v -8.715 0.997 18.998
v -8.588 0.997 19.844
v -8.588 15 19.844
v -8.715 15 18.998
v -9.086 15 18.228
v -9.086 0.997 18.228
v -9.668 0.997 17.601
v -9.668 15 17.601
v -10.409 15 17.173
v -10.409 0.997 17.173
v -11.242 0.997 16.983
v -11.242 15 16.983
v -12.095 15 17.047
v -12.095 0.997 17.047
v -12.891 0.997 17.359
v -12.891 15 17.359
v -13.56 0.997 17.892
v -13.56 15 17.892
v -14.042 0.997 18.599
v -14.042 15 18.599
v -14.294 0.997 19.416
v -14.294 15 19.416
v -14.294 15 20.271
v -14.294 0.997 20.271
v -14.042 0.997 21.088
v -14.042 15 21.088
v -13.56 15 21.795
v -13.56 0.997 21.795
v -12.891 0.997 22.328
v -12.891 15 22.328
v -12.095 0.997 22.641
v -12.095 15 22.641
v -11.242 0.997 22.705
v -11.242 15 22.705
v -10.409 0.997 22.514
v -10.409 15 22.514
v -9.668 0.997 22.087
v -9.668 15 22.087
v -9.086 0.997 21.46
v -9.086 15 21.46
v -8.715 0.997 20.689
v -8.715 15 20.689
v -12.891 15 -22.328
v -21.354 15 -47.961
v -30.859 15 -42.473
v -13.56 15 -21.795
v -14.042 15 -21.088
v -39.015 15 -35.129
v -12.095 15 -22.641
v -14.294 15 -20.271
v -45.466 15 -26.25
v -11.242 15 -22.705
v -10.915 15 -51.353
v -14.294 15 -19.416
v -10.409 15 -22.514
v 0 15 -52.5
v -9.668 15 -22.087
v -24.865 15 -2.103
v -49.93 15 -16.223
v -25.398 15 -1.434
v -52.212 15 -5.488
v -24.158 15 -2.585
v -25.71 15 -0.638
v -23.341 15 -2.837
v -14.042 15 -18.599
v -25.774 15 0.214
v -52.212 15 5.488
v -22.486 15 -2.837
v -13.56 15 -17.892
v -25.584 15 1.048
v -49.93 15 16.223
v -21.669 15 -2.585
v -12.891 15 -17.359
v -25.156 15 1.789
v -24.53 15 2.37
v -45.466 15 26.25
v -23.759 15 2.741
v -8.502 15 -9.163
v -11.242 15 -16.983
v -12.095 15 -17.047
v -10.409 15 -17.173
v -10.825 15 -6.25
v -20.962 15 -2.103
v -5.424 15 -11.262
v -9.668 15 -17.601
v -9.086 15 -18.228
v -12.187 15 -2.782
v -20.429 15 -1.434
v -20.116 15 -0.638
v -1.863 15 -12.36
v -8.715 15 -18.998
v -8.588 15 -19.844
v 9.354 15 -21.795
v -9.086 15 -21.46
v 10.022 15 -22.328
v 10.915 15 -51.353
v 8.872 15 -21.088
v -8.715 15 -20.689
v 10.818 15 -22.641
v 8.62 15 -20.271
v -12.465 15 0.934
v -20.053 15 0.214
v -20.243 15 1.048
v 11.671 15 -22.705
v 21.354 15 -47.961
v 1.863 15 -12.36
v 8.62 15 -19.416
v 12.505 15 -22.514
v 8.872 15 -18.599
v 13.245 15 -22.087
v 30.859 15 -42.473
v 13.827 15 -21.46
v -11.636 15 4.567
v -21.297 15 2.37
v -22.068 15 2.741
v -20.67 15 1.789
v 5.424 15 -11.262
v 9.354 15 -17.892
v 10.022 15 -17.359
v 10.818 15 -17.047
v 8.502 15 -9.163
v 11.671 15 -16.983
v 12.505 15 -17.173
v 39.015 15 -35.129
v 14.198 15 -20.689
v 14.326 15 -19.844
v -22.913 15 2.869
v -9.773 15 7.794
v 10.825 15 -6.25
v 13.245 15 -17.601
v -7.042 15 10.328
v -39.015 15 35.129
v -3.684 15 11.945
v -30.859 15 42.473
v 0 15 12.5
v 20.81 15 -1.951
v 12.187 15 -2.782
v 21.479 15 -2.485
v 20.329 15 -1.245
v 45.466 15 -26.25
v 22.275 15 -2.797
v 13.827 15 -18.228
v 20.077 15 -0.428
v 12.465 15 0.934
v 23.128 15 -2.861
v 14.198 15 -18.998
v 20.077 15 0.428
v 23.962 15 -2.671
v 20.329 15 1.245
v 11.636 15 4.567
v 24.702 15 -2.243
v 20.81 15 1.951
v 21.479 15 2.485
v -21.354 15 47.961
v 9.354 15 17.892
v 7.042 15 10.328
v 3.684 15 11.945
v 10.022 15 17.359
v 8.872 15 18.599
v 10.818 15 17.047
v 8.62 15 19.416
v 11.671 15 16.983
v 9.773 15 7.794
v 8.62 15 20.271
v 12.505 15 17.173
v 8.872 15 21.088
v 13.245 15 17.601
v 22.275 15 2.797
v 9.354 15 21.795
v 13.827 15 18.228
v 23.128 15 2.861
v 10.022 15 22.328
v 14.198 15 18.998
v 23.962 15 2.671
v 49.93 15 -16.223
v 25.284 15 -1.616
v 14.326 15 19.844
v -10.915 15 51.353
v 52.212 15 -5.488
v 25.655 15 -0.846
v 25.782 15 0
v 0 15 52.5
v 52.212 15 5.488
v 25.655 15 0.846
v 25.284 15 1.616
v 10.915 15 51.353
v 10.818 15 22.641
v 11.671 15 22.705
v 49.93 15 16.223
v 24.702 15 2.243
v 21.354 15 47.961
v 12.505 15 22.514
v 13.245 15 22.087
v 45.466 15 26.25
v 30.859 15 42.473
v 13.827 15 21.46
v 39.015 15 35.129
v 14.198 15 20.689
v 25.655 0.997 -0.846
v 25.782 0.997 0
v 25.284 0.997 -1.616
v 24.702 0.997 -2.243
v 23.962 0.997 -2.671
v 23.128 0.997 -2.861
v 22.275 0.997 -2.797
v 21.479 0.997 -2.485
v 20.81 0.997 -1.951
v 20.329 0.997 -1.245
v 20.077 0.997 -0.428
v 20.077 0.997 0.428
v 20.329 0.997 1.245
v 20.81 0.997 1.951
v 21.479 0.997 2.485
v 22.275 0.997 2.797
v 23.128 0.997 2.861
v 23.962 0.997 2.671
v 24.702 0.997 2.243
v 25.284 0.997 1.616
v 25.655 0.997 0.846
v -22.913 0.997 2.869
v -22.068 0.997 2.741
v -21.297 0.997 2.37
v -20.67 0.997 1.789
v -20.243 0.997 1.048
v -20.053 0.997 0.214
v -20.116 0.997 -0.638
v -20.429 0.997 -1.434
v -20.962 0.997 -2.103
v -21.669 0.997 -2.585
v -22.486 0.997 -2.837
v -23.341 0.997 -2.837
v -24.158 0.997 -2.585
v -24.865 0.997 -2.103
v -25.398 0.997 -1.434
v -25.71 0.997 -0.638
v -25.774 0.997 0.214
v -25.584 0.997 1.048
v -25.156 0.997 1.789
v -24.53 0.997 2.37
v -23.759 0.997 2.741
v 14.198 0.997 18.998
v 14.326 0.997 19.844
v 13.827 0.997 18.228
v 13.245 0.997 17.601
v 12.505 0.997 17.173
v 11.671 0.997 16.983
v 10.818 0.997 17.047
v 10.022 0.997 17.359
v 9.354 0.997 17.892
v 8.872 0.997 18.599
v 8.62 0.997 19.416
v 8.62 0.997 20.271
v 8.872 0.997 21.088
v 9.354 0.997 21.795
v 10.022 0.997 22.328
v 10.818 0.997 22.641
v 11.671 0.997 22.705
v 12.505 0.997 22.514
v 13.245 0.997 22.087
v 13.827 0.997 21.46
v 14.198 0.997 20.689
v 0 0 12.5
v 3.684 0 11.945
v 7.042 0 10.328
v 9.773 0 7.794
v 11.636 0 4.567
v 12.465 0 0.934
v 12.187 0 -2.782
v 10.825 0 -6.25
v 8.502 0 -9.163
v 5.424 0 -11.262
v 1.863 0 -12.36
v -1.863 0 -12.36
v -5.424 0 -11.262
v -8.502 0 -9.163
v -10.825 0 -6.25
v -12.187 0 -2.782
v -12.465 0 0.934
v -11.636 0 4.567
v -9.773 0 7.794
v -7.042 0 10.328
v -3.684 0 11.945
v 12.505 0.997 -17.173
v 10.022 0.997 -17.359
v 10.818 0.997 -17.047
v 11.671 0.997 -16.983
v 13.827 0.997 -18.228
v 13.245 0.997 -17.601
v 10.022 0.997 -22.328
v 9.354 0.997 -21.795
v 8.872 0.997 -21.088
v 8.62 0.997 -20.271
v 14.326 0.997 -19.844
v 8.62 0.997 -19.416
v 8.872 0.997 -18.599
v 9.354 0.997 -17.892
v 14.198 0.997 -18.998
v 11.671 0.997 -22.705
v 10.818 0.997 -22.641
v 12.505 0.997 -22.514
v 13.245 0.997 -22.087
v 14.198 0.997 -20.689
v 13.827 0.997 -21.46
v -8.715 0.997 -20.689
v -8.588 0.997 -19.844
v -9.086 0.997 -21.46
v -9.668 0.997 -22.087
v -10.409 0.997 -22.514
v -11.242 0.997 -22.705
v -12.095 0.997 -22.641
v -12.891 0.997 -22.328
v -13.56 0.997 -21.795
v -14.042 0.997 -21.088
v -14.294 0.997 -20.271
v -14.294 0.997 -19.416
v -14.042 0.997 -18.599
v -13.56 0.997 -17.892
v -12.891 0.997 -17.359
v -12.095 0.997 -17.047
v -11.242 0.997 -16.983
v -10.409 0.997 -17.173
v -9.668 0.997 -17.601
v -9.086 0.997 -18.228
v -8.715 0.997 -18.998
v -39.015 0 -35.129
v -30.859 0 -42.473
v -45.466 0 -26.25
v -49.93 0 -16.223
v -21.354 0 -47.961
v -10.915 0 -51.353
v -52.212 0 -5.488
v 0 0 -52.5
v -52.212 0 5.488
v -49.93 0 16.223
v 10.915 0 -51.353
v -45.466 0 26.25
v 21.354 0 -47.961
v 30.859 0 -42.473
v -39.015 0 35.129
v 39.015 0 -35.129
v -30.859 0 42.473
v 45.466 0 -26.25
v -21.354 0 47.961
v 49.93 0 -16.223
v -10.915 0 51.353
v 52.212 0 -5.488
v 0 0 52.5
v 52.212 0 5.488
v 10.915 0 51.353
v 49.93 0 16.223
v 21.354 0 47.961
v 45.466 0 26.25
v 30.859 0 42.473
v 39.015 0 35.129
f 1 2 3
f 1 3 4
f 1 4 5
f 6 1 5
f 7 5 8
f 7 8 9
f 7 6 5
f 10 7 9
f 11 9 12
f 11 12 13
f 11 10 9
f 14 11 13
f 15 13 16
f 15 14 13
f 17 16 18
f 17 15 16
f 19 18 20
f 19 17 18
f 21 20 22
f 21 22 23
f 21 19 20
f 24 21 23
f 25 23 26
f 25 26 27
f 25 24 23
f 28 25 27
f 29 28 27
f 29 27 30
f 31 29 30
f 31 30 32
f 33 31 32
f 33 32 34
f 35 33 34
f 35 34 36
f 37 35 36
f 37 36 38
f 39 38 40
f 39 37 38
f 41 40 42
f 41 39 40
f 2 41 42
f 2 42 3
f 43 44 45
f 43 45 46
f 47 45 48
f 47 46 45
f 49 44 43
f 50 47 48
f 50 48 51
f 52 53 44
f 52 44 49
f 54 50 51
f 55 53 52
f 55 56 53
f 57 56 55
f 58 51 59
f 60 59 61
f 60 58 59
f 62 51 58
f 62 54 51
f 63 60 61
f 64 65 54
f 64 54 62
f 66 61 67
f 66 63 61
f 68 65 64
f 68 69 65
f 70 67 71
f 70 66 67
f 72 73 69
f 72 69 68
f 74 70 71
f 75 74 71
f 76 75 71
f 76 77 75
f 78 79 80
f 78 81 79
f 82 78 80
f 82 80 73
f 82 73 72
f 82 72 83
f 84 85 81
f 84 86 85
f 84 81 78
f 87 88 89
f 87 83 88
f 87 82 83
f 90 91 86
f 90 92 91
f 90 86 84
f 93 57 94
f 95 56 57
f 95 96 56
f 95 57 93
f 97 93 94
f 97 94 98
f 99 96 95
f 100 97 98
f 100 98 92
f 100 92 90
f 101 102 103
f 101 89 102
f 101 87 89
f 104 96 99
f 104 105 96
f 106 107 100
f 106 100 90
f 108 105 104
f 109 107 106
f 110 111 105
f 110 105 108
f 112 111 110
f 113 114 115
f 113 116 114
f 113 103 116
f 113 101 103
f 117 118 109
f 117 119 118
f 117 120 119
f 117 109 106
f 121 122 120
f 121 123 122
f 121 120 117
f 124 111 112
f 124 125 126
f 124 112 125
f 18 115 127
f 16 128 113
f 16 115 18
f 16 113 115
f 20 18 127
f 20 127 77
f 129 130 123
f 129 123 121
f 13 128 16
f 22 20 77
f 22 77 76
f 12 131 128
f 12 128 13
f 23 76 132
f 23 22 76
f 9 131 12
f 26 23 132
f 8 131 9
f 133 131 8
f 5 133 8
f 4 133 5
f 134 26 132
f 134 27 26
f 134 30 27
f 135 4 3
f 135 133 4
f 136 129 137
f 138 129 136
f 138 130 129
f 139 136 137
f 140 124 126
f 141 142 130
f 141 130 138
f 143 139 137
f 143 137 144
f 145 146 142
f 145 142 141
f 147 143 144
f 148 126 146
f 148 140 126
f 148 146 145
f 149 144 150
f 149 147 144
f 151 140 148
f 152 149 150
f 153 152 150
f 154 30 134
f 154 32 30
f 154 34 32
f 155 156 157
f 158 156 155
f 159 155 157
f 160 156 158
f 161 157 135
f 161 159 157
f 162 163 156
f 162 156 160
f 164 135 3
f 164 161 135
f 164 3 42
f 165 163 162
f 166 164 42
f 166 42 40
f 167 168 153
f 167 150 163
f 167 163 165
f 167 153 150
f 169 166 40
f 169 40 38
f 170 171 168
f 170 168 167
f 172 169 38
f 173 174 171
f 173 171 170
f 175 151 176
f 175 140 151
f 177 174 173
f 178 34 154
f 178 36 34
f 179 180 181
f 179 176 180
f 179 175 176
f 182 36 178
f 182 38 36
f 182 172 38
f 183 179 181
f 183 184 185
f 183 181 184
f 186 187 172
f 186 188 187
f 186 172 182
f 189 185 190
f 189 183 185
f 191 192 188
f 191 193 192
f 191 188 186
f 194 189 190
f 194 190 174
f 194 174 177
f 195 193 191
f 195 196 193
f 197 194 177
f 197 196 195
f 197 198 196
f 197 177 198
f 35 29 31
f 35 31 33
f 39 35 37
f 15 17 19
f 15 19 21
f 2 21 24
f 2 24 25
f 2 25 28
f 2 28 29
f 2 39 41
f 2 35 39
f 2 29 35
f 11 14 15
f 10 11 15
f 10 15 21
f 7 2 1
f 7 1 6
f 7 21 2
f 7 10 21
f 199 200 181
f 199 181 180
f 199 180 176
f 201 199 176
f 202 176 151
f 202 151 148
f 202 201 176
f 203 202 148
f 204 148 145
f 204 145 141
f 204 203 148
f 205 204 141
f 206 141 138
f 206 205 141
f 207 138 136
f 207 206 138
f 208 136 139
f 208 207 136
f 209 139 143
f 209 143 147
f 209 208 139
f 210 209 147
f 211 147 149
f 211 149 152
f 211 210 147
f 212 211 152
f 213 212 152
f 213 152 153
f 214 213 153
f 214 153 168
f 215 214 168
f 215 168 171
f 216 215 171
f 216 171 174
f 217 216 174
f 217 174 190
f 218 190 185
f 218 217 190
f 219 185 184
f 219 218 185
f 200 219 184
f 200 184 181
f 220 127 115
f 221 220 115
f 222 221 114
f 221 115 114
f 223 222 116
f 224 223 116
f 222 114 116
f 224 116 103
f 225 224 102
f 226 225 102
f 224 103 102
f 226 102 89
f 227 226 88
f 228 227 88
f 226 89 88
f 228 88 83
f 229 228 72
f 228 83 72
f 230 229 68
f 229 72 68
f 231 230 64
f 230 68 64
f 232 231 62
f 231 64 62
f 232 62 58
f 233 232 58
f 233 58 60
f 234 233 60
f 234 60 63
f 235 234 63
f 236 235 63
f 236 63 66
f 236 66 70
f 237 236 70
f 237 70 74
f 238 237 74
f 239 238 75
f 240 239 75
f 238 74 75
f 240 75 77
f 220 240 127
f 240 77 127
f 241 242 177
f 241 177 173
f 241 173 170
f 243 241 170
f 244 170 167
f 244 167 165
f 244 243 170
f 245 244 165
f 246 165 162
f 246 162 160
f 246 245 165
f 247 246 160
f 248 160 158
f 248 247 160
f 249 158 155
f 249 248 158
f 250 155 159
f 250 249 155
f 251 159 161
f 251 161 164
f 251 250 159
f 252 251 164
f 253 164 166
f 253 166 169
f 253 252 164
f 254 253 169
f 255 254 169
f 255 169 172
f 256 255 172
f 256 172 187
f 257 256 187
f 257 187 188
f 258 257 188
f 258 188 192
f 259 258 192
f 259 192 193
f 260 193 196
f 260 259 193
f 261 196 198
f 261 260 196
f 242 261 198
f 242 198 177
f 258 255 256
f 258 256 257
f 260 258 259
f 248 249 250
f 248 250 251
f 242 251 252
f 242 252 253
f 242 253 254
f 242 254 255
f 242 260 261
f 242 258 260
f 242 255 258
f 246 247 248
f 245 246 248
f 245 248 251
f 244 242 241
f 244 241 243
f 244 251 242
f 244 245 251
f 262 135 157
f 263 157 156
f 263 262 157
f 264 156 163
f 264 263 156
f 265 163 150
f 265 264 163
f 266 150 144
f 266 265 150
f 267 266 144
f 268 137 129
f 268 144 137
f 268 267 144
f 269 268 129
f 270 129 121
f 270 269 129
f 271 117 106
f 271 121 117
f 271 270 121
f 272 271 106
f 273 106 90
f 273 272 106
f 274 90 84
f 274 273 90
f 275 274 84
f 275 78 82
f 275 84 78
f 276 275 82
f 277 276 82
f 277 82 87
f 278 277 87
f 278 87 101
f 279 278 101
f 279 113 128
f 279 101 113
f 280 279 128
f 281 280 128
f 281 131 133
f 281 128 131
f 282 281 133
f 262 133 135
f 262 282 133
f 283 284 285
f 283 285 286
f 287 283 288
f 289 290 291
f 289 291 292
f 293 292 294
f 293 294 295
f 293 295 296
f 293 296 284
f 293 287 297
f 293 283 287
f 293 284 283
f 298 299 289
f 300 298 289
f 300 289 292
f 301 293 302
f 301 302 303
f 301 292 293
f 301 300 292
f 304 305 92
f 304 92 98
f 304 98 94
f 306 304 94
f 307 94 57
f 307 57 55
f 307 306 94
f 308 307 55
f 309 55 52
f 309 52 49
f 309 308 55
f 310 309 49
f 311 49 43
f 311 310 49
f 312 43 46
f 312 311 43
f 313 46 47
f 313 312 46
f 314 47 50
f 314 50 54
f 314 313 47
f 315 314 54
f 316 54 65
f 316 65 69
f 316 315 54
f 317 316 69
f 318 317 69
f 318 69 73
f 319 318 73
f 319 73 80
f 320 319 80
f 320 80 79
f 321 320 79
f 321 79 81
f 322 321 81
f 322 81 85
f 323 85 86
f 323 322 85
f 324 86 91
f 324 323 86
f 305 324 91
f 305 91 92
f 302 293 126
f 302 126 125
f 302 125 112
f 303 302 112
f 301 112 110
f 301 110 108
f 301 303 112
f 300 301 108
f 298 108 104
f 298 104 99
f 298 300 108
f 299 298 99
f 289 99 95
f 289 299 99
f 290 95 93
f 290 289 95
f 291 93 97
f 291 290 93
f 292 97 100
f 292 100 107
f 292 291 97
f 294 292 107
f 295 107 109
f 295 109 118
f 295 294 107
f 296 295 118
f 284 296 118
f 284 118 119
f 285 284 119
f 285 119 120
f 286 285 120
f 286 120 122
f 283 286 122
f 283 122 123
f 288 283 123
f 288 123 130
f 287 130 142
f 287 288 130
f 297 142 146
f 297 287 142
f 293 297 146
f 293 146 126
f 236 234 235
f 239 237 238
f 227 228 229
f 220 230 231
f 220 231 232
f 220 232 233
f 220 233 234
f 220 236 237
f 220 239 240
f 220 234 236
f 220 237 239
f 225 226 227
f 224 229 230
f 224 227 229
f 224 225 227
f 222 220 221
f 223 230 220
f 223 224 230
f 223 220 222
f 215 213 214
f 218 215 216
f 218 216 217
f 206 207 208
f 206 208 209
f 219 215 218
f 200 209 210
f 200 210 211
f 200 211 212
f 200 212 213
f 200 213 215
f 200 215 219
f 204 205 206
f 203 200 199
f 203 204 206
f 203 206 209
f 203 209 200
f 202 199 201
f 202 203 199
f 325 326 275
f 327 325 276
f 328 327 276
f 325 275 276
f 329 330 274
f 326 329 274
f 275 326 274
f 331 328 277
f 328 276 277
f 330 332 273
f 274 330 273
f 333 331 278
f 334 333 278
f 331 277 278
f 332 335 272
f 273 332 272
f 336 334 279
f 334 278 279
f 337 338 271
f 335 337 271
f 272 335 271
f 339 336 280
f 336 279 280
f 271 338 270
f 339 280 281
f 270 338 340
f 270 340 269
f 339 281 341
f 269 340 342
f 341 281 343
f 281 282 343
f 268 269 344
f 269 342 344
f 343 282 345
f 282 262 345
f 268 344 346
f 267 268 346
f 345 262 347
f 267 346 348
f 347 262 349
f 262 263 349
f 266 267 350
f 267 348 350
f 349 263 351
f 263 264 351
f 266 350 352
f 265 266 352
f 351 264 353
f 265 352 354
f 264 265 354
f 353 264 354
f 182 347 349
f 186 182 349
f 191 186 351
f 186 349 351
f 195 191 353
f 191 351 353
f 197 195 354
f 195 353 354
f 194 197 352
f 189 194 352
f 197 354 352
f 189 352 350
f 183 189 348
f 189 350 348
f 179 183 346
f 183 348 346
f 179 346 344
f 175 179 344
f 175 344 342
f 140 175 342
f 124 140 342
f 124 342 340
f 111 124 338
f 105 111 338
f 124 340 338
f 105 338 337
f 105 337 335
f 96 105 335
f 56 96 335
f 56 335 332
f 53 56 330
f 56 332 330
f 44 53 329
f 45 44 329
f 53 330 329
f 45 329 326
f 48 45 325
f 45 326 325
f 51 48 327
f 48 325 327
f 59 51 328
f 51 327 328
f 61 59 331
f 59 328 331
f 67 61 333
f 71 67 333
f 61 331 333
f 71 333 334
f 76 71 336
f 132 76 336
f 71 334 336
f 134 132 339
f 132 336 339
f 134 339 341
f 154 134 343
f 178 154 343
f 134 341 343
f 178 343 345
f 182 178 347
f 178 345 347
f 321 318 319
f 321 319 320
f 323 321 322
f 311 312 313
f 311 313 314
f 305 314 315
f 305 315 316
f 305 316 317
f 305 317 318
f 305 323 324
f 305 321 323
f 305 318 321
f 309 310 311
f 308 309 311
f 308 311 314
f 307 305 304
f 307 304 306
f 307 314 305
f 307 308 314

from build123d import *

# Parameters (mm, degrees)
SKETCH1_R           = 52.5
BOSS_EXTRUDE1_DEPTH = 15
SKETCH2_R           = 12.5
CUT_EXTRUDE1_DEPTH  = 76.746287038
SKETCH3_R           = 2.868901353
CUT_EXTRUDE2_DEPTH  = 14.003451283
CIRPATTERN1_COUNT   = 6


with BuildPart() as part:
    # Sketch1 → Boss-Extrude1 (new body)
    with BuildSketch(Plane(origin=(0, 0, 0), x_dir=(1, 0, 0), z_dir=(0, 1, 0))):
        Circle(SKETCH1_R)
    extrude(amount=BOSS_EXTRUDE1_DEPTH)

    # Sketch2 → Cut-Extrude1 (cut, through all)
    with BuildSketch(Plane(origin=(0, 0, 0), x_dir=(1, 0, 0), z_dir=(0, 1, 0))):
        Circle(SKETCH2_R)
    extrude(amount=CUT_EXTRUDE1_DEPTH, mode=Mode.SUBTRACT)

    # Sketch3 → Cut-Extrude2 (cut)
    with BuildSketch(Plane(origin=(0, 15, 0), x_dir=(1, 0, 0), z_dir=(0, 1, 0))):
        with Locations((-22.913471565, 0)):
            Circle(SKETCH3_R)
    cut_extrude2 = extrude(amount=-CUT_EXTRUDE2_DEPTH, mode=Mode.SUBTRACT)

    # CirPattern1: Cut-Extrude2 ×6 about axis
    cirpattern1_axis = Axis((0, 0, 0), (0, 1, 0))
    for i in range(1, CIRPATTERN1_COUNT):
        add(cut_extrude2.rotate(cirpattern1_axis, i * 360 / CIRPATTERN1_COUNT), mode=Mode.SUBTRACT)


solid = part.part
